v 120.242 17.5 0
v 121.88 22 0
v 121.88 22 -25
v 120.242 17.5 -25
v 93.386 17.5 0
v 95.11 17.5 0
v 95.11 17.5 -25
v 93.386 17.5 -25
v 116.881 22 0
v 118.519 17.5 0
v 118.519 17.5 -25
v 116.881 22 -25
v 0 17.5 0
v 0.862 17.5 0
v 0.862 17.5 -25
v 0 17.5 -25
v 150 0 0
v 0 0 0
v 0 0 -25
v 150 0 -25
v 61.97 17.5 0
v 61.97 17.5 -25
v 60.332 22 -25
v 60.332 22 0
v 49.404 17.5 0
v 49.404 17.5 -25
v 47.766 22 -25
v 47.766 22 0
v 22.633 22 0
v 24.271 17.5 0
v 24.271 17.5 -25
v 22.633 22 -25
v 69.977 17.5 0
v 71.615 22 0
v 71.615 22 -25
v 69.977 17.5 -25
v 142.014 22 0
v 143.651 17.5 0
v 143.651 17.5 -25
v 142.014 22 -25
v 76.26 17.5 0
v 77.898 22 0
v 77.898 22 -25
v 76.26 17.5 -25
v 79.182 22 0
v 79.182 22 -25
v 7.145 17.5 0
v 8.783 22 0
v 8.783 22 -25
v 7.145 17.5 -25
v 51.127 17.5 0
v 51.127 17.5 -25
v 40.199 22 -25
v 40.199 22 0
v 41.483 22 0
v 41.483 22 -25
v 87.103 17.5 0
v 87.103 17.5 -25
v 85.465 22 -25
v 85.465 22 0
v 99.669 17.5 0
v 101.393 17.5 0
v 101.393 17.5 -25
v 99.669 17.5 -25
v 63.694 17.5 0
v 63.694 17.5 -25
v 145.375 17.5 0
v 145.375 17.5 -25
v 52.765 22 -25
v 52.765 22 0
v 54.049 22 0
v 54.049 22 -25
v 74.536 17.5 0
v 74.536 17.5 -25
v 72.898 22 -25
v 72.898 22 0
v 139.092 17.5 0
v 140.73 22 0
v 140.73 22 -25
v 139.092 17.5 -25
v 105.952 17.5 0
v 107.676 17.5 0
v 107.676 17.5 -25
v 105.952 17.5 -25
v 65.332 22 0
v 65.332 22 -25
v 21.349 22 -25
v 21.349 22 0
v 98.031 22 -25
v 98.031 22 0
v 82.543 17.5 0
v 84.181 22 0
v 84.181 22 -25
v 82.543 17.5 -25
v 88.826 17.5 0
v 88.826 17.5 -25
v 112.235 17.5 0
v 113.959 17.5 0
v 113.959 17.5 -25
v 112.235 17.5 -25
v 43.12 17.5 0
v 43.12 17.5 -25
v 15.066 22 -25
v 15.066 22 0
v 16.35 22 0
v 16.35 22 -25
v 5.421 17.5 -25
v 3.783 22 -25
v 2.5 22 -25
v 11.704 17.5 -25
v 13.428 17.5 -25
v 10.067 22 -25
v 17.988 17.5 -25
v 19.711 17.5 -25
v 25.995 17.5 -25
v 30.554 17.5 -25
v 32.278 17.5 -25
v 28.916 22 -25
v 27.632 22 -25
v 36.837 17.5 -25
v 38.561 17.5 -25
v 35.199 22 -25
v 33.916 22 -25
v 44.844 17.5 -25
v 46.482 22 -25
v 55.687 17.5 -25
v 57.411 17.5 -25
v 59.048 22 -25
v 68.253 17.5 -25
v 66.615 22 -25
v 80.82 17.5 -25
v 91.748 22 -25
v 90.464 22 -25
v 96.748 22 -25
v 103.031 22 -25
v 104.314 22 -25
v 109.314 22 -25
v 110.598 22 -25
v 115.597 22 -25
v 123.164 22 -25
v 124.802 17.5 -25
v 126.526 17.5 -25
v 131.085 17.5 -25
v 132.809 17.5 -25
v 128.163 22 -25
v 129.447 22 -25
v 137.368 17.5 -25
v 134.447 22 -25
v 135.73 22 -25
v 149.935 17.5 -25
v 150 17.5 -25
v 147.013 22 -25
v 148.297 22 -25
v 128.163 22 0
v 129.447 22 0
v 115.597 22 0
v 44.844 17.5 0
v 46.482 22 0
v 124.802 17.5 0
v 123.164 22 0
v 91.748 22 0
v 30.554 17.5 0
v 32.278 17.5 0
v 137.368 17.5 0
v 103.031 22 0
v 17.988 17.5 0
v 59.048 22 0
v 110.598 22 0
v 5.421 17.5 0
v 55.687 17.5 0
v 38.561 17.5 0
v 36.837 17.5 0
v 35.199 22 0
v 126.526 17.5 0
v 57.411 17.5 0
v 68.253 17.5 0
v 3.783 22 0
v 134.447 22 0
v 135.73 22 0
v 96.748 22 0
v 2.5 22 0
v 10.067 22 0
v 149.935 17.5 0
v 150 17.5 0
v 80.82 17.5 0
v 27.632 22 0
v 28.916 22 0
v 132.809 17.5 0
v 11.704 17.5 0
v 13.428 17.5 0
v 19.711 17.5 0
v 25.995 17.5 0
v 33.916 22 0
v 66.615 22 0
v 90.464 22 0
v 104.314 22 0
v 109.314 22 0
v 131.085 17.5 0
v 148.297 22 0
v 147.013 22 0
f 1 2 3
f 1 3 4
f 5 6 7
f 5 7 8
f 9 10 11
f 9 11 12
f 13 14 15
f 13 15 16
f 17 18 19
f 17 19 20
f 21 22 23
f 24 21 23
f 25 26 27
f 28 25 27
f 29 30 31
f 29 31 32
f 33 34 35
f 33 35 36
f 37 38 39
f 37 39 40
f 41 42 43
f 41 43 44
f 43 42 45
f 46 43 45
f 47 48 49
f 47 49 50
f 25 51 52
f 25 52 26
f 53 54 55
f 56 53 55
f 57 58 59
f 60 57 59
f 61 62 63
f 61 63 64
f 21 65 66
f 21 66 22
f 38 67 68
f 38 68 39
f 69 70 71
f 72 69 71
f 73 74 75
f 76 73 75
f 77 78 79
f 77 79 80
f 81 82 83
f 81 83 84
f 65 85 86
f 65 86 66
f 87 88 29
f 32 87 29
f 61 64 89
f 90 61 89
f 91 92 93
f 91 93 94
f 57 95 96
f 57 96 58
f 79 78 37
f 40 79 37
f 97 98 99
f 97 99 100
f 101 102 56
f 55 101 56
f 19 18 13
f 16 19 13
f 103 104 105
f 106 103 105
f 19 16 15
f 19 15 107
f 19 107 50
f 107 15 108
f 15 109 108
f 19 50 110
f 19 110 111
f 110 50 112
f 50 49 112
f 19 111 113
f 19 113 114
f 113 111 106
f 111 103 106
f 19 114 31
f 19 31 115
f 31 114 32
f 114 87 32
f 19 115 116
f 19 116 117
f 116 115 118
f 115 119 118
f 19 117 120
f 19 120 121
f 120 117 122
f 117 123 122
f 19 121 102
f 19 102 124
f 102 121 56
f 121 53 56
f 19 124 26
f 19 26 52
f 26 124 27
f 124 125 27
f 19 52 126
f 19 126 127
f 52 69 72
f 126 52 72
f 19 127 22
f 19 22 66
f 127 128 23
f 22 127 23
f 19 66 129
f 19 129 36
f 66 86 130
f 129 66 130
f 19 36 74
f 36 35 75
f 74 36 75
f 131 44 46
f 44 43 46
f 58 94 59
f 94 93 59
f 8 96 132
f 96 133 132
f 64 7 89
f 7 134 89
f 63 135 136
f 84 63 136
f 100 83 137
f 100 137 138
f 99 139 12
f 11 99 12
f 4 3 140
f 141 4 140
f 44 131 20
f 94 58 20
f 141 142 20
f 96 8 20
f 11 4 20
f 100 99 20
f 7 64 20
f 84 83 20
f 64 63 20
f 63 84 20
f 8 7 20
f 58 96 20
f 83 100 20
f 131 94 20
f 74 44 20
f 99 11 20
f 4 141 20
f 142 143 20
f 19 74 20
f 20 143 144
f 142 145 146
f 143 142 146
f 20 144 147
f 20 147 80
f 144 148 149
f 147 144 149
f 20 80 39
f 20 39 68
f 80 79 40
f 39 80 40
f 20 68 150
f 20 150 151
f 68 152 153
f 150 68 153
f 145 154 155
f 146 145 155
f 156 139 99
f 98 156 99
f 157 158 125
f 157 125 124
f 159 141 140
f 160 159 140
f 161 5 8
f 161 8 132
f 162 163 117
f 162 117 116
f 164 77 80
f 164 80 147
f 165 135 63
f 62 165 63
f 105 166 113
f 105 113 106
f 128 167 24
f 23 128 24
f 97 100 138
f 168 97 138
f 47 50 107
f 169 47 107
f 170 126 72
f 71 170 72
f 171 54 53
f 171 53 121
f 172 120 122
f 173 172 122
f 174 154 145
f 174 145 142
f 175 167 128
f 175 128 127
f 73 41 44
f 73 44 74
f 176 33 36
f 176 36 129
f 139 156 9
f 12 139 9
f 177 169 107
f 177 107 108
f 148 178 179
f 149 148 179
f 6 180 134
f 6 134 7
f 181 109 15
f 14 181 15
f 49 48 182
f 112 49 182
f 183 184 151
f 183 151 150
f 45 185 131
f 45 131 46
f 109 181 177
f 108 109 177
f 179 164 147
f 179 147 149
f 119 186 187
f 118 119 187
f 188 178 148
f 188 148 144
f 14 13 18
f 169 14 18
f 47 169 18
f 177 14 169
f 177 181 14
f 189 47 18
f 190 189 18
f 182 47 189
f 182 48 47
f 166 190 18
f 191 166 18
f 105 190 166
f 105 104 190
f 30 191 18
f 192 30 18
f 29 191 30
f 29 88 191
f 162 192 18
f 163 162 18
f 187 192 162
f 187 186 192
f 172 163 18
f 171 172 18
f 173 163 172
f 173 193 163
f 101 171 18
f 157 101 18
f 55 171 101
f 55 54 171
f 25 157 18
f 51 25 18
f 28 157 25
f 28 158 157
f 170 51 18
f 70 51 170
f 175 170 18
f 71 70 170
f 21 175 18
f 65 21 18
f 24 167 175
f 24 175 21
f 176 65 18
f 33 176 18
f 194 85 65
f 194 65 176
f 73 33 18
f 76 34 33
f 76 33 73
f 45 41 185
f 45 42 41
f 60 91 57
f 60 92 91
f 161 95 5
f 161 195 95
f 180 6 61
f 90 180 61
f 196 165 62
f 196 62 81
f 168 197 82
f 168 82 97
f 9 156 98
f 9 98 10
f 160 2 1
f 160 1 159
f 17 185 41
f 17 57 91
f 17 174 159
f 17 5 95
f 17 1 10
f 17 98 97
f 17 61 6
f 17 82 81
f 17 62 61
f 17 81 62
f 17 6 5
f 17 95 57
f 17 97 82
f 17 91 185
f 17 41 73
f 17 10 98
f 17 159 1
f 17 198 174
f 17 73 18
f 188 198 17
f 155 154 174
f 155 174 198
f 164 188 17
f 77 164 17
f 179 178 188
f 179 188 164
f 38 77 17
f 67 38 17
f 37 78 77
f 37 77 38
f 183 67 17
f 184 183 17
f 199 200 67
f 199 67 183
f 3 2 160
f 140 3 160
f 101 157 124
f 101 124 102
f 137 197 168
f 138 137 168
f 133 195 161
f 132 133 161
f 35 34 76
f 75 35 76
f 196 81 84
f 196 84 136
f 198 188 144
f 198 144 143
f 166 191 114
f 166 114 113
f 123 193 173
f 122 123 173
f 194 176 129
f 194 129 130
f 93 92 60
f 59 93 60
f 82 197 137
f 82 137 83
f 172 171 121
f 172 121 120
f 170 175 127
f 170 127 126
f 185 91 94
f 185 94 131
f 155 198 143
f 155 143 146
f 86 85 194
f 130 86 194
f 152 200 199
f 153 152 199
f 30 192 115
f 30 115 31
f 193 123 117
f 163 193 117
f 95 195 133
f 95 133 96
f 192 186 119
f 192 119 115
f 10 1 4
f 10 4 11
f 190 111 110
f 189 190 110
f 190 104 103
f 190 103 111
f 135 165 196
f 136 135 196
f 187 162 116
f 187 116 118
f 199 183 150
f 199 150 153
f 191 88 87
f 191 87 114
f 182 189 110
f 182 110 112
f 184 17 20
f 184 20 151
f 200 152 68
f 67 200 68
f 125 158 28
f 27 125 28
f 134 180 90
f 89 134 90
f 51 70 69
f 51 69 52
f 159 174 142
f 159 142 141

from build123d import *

# Parameters (mm, degrees)
BLANKSKE_W        = 150
BLANKSKE_H        = 22
BLANK_DEPTH       = 25
TOOTHCUTSIM_DEPTH = 154.65220467
TEETHCUTS_COUNT   = 25
TEETHCUTS_PITCH   = 6.2831853


with BuildPart() as part:
    # BlankSke → Blank (new body)
    with BuildSketch(Plane.XY):
        with Locations((75, 11)):
            Rectangle(BLANKSKE_W, BLANKSKE_H)
    extrude(amount=-BLANK_DEPTH)

    # TooCutSkeSim → ToothCutSim (cut, through all)
    with BuildSketch(Plane.XY):
        Polygon((0.861870739, 17.5), (-0.861870739, 17.5), (-2.508981637, 22.0254), (2.508981637, 22.0254), align=None)
    toothcutsim = extrude(amount=-TOOTHCUTSIM_DEPTH, mode=Mode.SUBTRACT)

    # TeethCuts: ToothCutSim ×25
    with Locations(*[(i * TEETHCUTS_PITCH, 0, 0) for i in range(1, TEETHCUTS_COUNT)]):
        add(toothcutsim, mode=Mode.SUBTRACT)


solid = part.part
